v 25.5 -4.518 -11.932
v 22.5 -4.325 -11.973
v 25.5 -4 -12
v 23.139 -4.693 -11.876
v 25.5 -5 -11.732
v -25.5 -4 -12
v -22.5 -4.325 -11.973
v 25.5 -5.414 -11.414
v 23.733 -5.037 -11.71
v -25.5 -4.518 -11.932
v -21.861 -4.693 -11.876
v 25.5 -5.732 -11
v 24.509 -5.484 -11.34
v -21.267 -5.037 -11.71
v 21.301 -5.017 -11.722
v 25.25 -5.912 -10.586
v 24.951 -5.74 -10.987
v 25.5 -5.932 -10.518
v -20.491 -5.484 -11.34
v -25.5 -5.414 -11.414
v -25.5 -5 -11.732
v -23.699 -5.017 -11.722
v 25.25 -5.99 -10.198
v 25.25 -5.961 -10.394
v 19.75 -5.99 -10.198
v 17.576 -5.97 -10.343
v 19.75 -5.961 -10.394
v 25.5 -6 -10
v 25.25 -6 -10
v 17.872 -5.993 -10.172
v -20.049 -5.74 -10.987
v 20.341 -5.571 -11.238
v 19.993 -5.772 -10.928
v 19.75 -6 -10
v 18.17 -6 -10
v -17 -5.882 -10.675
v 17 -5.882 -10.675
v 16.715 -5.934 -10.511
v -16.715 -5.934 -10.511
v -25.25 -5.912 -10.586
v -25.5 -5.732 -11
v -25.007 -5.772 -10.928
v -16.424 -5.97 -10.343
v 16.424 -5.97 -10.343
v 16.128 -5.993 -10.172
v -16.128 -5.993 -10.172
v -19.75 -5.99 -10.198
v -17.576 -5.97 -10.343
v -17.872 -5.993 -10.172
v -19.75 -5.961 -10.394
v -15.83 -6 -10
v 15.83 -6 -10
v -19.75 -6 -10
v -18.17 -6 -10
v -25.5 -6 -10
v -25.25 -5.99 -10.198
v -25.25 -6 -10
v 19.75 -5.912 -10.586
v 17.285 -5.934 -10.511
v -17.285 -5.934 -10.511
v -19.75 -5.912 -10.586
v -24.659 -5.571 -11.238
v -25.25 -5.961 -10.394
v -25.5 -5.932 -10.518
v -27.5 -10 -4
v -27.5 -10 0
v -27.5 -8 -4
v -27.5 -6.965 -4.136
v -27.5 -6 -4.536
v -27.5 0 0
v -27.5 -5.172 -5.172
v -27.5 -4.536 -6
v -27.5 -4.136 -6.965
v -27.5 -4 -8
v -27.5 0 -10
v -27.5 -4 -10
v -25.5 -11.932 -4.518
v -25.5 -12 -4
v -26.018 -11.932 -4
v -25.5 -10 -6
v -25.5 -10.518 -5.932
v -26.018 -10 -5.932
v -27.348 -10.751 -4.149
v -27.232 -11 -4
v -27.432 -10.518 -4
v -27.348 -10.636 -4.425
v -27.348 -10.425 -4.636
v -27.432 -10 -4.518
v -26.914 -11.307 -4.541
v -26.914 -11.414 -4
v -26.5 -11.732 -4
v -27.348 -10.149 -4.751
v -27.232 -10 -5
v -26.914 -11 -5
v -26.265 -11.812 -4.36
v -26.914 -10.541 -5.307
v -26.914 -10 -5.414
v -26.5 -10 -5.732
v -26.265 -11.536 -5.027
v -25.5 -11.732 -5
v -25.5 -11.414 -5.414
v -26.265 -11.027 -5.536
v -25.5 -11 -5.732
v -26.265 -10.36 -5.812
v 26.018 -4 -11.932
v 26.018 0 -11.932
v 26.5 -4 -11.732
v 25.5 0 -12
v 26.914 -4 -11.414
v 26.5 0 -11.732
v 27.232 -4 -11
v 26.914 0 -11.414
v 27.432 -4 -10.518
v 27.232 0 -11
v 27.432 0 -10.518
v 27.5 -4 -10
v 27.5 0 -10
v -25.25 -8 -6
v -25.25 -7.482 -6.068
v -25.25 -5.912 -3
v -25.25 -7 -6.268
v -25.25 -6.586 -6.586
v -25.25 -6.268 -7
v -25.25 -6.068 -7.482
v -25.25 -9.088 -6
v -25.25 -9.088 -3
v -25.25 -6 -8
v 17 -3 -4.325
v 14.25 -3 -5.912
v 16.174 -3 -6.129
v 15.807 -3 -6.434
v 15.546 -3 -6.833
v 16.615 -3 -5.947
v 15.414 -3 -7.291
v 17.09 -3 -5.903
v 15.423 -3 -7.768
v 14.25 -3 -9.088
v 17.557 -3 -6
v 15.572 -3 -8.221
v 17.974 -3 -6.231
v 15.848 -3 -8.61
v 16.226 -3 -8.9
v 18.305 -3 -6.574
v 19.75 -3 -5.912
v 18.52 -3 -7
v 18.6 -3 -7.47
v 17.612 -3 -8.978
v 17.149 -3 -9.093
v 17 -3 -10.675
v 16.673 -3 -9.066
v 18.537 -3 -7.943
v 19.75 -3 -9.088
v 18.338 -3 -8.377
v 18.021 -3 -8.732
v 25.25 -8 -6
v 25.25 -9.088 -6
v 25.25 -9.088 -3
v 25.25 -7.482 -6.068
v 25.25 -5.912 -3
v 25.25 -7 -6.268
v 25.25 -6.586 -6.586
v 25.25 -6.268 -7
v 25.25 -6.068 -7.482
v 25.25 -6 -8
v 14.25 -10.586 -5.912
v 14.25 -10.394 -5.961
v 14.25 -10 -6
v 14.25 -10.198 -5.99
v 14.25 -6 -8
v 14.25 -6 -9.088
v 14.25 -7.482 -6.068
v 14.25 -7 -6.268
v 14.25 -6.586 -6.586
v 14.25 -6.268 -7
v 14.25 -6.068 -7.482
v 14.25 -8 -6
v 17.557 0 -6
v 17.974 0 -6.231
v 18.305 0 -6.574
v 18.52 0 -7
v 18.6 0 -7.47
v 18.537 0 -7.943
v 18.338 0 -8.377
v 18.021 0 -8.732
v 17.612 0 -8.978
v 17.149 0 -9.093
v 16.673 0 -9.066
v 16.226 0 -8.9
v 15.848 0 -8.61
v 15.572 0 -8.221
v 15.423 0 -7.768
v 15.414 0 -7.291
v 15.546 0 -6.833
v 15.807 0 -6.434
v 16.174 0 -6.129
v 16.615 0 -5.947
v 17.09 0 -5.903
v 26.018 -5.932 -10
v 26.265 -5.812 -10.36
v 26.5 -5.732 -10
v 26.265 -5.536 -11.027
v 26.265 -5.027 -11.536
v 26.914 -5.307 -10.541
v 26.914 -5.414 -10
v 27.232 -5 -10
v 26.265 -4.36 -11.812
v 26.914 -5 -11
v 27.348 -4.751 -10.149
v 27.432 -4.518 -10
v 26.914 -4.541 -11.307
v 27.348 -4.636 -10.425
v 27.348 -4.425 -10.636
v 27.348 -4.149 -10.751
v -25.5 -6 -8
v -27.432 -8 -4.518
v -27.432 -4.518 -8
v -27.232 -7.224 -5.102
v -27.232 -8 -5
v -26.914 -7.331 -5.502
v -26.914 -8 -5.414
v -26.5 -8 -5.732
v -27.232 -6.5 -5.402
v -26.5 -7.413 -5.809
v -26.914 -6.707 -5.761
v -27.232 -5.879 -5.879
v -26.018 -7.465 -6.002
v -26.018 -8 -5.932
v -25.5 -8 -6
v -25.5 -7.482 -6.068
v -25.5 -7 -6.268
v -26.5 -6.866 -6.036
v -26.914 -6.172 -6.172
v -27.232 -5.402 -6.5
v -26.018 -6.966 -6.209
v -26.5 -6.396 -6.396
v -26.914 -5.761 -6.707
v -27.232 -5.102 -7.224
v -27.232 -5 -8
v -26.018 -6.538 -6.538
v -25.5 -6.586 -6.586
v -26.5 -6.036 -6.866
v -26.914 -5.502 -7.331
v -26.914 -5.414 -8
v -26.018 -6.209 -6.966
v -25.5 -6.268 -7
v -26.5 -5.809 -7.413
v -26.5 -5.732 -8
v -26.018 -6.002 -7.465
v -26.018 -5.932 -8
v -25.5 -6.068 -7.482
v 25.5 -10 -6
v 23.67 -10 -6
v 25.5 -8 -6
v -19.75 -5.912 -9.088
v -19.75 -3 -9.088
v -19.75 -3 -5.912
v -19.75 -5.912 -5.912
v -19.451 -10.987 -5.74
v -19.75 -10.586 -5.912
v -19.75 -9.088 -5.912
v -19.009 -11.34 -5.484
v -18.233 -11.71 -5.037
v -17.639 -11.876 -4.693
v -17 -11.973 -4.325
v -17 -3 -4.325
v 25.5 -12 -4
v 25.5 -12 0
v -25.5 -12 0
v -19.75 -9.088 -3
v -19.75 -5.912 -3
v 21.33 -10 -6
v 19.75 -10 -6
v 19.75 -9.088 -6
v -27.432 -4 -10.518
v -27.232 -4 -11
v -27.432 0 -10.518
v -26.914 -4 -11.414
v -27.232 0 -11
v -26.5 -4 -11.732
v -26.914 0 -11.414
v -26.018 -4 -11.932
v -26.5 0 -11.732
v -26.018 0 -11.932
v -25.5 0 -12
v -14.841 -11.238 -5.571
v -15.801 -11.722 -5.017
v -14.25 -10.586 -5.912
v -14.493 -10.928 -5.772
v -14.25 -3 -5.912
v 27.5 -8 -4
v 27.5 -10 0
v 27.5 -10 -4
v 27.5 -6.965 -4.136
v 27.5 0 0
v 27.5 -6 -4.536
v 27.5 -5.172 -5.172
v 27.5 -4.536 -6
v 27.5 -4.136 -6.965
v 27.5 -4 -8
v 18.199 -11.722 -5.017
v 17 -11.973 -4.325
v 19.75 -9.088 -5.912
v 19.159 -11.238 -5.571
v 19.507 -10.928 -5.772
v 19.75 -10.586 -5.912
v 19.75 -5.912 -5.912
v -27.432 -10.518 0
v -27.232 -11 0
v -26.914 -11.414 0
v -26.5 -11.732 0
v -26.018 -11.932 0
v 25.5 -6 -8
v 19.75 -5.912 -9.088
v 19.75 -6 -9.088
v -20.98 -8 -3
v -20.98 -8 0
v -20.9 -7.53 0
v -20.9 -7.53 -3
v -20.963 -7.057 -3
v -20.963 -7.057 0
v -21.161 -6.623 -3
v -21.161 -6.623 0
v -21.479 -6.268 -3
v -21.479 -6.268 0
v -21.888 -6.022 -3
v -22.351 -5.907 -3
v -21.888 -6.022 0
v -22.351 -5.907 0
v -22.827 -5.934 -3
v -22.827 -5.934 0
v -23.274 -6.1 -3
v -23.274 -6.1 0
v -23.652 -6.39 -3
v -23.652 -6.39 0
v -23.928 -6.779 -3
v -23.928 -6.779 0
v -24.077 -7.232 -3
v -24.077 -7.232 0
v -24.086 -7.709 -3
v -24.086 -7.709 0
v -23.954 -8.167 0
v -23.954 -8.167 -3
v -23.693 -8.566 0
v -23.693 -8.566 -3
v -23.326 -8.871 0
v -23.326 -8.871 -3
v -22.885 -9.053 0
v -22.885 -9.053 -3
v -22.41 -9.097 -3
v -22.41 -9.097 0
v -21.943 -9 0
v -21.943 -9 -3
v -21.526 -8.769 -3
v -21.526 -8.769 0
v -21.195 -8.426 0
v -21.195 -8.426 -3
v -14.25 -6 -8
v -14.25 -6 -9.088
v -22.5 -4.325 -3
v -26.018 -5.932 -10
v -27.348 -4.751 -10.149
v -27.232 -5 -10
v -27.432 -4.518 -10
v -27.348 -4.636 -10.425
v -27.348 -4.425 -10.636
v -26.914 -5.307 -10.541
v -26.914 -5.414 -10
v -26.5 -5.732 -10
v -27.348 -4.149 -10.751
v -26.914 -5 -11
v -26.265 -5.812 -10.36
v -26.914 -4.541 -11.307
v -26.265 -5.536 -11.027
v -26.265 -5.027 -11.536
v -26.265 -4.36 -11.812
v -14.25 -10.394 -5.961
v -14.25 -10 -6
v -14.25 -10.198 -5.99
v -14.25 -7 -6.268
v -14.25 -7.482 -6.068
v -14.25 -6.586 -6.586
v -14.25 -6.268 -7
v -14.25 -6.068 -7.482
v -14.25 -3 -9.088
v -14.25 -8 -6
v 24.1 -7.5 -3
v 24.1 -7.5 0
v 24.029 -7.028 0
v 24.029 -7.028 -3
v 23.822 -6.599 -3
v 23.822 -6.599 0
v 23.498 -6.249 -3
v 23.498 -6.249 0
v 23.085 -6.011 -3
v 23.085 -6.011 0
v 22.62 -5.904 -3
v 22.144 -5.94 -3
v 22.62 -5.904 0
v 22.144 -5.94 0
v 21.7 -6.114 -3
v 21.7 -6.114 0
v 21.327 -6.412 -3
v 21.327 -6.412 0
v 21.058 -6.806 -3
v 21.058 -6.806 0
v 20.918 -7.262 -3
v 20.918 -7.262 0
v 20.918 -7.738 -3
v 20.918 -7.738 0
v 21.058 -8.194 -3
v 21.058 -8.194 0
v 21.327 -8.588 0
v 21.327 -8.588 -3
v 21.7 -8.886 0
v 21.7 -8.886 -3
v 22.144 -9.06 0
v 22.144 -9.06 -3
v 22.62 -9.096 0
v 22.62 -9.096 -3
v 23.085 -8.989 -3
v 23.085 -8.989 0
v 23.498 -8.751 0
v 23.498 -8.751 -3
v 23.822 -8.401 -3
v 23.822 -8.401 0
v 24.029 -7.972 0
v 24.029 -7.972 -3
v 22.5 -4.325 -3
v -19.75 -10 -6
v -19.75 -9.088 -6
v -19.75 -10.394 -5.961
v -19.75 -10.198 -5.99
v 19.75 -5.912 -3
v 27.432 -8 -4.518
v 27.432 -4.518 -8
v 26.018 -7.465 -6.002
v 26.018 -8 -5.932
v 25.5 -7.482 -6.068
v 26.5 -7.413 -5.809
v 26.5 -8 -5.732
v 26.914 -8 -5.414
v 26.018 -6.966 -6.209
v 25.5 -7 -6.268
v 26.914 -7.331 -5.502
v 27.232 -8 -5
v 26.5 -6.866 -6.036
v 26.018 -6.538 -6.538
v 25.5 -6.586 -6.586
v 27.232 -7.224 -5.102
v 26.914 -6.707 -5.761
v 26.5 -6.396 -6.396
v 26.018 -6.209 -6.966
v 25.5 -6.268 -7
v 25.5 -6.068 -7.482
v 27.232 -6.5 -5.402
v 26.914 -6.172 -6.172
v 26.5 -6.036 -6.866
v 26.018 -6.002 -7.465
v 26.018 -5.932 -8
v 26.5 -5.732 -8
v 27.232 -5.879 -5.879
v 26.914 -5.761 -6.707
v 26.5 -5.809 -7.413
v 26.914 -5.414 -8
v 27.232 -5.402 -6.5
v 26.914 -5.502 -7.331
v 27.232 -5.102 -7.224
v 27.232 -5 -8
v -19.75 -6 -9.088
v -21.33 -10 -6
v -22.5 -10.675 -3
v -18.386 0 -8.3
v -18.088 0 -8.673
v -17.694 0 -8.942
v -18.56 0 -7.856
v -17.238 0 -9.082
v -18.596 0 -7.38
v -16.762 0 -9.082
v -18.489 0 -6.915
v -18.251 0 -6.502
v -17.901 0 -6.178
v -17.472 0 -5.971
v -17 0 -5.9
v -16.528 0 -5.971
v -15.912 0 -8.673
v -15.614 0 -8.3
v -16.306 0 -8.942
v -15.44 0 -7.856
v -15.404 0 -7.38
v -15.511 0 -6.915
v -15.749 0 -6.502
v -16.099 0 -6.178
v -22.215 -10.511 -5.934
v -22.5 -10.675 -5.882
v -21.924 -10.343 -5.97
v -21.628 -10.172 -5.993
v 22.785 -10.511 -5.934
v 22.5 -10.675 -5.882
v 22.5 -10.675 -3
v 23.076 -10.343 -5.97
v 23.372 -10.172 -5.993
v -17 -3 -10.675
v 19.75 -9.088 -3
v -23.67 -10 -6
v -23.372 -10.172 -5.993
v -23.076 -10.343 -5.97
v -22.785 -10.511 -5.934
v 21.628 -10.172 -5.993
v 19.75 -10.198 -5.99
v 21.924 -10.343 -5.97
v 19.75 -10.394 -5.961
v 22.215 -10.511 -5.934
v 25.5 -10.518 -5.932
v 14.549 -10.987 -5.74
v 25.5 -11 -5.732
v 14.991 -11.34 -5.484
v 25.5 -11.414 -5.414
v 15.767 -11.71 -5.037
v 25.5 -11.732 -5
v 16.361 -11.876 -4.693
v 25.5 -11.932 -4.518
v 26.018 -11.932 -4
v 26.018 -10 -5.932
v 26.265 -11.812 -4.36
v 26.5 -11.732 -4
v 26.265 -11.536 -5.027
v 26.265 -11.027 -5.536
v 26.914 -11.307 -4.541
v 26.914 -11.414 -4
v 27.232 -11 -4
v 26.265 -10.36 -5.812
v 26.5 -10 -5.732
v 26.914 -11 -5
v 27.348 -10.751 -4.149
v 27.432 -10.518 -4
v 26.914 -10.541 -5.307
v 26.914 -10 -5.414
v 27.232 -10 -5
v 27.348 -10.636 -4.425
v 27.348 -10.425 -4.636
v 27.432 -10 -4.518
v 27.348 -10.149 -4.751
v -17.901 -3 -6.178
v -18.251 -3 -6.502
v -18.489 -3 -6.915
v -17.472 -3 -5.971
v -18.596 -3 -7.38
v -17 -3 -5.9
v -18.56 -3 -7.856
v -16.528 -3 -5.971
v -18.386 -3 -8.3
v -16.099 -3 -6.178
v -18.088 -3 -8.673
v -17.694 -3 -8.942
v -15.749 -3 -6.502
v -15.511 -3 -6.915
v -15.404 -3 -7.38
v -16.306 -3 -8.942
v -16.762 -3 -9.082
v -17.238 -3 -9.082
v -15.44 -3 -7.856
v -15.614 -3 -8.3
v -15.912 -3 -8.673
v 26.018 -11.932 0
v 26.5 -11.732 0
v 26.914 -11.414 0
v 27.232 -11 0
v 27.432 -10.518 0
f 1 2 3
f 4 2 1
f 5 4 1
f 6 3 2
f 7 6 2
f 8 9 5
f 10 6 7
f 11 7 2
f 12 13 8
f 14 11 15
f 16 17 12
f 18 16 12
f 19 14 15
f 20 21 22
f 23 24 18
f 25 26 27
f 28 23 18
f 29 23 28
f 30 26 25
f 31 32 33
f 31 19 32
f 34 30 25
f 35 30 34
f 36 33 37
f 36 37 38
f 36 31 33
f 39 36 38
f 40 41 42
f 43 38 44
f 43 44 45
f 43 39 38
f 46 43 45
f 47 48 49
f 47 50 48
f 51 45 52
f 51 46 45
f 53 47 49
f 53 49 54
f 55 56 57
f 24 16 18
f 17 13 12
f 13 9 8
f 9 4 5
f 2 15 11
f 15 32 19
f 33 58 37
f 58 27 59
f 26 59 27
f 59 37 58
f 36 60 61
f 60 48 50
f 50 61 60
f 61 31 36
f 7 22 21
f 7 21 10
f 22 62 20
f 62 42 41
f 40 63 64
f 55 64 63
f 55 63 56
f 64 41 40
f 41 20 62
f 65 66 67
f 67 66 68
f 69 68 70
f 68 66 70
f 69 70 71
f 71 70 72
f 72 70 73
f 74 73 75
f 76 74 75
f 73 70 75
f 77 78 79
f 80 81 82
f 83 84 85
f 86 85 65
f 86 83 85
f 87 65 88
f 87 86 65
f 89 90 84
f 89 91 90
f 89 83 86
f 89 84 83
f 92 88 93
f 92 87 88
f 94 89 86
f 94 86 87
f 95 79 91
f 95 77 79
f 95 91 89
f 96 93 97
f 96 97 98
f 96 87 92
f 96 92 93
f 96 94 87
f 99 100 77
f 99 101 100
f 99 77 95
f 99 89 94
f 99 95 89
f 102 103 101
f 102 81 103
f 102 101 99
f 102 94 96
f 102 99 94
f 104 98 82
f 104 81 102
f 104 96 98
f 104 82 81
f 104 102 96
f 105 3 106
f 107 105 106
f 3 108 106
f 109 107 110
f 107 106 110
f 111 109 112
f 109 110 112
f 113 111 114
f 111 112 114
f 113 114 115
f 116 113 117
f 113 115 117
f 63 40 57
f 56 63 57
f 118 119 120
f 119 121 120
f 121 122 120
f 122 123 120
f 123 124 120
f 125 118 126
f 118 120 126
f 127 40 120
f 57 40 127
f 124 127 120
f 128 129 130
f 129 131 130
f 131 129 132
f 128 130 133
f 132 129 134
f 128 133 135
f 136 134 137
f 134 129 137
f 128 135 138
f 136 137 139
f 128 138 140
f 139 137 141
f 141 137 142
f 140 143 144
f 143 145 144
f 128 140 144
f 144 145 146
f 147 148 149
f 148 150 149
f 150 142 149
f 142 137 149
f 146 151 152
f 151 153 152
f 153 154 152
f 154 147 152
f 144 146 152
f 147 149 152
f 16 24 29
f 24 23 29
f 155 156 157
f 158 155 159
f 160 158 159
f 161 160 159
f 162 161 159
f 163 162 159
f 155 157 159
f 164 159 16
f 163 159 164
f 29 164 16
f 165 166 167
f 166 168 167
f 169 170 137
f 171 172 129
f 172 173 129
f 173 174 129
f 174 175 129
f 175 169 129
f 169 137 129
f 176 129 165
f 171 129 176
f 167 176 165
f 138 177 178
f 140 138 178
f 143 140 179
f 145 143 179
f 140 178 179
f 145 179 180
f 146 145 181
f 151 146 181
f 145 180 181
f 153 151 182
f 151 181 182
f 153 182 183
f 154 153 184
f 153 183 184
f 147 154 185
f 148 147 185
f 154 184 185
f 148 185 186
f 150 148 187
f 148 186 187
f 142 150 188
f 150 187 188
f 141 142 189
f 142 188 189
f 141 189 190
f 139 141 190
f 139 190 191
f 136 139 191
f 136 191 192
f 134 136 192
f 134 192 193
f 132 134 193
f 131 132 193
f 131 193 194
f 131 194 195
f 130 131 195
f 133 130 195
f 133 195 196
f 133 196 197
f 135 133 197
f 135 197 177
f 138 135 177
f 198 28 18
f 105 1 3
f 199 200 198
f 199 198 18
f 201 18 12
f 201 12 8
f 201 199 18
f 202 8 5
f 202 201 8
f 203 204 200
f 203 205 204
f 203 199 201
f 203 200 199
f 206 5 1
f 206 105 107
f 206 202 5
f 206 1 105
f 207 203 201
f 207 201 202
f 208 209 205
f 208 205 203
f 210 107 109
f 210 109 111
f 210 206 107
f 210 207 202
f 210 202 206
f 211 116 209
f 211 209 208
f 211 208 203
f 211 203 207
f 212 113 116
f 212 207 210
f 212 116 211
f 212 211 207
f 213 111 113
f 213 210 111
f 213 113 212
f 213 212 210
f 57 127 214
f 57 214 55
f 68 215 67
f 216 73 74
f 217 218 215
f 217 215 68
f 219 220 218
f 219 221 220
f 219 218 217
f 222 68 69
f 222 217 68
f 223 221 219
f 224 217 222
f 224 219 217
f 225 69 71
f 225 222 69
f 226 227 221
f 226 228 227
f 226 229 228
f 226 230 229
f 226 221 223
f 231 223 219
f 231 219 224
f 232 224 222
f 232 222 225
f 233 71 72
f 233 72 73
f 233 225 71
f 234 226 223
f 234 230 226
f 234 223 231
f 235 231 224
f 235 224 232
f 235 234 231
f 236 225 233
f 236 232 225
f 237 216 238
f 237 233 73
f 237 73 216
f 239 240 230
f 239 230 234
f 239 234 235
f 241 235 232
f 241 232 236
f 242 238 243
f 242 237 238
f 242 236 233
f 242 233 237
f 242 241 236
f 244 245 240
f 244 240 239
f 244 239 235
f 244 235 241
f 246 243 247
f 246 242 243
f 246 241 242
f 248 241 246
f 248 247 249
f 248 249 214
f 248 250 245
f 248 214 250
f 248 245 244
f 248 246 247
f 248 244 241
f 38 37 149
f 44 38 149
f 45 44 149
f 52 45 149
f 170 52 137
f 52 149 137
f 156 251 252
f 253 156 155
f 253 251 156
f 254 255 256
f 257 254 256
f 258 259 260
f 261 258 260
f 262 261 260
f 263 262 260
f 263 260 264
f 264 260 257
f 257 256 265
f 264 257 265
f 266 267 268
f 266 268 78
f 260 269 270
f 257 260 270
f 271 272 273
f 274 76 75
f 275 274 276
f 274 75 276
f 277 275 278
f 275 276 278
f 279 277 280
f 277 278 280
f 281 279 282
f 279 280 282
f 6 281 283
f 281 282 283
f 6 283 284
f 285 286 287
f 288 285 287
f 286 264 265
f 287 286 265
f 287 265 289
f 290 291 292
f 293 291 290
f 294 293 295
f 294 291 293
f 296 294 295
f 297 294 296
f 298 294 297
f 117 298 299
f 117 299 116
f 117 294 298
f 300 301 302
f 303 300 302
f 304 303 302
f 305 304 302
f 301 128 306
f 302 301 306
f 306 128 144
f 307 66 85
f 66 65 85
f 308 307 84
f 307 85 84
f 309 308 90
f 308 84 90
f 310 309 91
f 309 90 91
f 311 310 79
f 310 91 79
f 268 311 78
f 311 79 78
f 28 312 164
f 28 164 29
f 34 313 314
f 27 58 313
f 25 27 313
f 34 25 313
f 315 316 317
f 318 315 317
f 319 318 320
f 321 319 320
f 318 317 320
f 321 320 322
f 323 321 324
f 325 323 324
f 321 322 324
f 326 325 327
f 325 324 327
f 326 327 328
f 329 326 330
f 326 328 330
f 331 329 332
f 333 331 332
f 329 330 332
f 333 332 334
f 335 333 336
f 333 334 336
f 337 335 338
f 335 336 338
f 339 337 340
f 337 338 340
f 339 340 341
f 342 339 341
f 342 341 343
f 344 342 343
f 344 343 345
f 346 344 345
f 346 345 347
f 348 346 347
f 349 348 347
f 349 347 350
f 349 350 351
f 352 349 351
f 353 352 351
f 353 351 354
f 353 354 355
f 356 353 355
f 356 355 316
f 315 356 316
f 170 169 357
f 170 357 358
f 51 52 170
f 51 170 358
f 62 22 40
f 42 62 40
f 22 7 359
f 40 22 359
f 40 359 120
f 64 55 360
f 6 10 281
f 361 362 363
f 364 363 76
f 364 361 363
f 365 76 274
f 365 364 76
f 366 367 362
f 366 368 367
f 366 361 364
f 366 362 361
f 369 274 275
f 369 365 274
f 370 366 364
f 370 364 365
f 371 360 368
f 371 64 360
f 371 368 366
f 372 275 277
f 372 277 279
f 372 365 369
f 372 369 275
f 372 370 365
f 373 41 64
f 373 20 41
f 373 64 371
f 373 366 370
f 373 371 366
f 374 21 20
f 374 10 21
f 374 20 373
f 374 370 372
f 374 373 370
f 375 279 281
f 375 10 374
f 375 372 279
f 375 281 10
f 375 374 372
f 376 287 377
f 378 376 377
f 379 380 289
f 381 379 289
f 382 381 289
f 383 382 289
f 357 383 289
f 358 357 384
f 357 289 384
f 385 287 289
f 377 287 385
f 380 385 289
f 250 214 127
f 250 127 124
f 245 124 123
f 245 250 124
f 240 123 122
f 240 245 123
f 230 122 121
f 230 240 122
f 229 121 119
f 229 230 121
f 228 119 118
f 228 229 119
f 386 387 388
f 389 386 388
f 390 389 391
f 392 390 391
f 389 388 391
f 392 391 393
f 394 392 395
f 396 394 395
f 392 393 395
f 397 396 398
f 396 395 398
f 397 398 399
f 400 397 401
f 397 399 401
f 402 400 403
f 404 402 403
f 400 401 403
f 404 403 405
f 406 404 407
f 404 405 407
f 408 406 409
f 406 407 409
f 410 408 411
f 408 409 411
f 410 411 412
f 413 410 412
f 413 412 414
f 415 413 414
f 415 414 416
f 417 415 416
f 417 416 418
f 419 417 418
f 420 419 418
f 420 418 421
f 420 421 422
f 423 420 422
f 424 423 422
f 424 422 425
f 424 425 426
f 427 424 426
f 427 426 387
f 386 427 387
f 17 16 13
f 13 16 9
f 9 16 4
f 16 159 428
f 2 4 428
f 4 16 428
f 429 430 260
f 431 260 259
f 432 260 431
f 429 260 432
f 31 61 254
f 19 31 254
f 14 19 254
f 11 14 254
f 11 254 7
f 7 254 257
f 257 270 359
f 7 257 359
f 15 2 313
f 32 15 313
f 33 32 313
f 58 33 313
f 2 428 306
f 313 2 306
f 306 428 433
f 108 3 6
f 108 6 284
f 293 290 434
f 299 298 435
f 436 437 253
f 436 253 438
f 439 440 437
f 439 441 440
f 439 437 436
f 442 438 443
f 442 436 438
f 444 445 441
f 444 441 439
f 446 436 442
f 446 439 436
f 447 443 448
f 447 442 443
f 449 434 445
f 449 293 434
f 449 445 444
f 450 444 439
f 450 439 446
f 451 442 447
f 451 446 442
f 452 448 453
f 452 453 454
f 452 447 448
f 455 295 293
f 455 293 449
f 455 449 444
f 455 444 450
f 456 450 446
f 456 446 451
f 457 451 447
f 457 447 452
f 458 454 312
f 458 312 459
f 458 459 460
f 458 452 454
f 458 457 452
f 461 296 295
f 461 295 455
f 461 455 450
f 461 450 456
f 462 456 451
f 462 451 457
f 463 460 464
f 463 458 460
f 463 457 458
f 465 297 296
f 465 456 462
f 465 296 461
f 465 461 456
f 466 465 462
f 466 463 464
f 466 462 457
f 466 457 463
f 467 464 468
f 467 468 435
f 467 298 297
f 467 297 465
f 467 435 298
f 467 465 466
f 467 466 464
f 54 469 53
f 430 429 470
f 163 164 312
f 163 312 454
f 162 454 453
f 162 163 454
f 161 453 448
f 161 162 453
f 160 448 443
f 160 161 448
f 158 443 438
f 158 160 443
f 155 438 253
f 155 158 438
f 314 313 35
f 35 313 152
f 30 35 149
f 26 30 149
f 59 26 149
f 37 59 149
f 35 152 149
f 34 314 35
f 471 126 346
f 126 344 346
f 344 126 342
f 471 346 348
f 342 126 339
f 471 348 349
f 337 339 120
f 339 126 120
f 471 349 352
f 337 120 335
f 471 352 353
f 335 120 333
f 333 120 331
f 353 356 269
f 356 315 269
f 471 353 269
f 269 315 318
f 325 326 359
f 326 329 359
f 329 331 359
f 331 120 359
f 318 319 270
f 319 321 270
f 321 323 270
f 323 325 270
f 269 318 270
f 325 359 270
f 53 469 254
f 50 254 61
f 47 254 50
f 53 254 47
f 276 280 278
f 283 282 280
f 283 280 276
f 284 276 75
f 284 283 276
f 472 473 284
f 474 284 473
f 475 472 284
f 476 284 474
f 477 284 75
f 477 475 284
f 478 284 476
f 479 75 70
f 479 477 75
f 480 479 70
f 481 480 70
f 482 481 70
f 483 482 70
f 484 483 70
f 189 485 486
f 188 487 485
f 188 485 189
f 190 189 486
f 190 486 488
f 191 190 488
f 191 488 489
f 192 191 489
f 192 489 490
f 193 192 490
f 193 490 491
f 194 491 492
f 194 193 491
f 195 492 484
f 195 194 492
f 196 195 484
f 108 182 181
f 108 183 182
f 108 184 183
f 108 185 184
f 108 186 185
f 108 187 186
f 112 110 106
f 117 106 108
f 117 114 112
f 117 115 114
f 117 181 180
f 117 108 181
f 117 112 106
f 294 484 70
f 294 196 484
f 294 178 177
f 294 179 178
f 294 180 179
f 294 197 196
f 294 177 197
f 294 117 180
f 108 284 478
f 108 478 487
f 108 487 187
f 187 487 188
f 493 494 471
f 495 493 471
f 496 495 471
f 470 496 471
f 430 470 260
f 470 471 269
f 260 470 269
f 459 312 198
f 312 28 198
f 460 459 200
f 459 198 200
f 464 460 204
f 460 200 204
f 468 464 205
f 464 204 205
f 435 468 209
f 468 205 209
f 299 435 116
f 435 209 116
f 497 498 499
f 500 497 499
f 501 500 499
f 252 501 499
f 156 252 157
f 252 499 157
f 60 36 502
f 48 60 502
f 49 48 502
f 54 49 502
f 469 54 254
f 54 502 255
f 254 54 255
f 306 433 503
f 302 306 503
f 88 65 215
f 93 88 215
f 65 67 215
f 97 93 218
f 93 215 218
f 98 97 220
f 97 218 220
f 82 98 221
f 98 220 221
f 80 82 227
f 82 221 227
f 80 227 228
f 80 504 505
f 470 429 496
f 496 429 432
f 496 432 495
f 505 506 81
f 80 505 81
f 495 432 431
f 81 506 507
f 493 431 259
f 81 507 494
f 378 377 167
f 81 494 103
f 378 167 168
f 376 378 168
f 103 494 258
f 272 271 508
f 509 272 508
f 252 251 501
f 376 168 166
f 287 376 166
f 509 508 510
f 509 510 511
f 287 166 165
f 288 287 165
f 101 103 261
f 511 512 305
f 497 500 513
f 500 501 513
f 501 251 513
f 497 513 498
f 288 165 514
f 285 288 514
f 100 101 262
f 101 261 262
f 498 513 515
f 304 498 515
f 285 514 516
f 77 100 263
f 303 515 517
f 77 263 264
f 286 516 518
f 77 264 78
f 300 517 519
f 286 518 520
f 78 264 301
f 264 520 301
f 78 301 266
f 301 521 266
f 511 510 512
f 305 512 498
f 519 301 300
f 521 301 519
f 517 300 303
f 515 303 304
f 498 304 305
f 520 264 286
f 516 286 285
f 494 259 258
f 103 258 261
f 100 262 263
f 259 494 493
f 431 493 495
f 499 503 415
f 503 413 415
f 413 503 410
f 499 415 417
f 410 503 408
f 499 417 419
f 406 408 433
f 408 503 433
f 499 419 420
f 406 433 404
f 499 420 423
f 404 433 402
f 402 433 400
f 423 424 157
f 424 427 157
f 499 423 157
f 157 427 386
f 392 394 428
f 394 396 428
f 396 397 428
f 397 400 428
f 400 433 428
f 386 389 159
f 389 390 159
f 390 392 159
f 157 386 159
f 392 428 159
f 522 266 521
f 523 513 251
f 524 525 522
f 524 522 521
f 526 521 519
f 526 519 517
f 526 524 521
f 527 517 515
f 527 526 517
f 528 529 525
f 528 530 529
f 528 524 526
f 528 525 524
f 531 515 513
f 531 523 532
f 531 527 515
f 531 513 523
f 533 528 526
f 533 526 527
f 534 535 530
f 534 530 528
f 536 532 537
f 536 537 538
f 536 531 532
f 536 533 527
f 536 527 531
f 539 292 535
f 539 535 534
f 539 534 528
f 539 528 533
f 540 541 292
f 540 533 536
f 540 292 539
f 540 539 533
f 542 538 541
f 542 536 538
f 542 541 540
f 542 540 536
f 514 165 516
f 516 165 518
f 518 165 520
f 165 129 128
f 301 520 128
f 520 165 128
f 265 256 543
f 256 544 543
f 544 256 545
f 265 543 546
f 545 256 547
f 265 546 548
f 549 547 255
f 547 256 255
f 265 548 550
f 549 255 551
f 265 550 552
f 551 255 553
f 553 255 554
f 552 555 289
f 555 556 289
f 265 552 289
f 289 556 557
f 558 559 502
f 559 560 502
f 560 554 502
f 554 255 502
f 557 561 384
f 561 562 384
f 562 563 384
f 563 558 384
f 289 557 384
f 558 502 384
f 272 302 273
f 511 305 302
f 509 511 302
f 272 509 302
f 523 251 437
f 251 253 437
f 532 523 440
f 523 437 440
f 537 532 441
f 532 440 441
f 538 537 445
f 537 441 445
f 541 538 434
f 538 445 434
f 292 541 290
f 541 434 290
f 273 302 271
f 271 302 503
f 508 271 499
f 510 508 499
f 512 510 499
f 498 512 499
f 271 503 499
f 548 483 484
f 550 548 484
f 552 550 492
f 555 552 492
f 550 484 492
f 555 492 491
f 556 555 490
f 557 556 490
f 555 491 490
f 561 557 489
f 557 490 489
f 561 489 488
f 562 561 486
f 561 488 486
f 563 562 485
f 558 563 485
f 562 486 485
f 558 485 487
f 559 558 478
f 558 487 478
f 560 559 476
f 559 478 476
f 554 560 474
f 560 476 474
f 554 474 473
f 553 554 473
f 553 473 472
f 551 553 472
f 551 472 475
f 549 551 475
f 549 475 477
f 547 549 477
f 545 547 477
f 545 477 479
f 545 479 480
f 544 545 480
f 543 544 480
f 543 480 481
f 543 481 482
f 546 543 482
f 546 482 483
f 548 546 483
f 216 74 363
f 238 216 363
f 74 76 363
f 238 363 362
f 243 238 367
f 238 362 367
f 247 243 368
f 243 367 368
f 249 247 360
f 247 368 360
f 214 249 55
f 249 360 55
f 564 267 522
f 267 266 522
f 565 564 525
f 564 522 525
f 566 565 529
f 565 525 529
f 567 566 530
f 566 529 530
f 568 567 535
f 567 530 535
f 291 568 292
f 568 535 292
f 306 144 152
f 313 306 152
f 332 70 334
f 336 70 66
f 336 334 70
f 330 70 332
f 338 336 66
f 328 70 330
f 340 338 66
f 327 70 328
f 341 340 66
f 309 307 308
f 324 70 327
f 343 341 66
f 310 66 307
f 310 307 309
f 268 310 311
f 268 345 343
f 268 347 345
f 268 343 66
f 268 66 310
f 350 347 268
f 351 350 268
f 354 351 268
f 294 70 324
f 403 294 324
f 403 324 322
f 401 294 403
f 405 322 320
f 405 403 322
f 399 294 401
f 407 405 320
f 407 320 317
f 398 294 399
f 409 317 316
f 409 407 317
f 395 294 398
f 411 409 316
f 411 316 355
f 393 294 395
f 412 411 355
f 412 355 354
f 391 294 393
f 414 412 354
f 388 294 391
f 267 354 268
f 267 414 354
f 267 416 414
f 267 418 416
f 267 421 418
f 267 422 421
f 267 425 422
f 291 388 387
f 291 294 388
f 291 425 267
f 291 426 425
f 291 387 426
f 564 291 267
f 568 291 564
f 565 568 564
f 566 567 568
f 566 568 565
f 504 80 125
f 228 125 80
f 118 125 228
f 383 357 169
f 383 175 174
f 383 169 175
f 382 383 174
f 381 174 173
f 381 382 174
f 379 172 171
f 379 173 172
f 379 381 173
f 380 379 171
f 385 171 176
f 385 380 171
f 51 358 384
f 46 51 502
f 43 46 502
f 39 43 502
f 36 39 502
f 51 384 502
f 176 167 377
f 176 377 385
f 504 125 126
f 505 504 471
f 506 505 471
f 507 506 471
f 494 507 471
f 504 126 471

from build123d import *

# Parameters (mm, degrees)
EXTRU_MINCE1_DEPTH      = 27.5
CONG_2_R                = 2
ESQUISSE2_R             = 1.6
ENL_V_MAT_EXTRU_1_DEPTH = 33.314857264
ESQUISSE3_R             = 1.6
ENL_V_MAT_EXTRU_2_DEPTH = 33.314857386
ENL_V_START             = -3
ENL_V_MAT_EXTRU_3_DEPTH = 30.314857423
ENL_V_MAT_EXTRU_4_DEPTH = 30.314857386
CONG_1_R                = 2


with BuildPart() as part:
    # Esquisse1 → Extru.-Mince1 (new, symmetric)
    with BuildSketch(Plane(origin=(0, 0, 0), x_dir=(0, 0, -1), z_dir=(1, 0, 0))):
        Polygon((12, 0), (0, 0), (0, -12), (6, -12), (6, -6), (12, -6), align=None)
    extrude(amount=EXTRU_MINCE1_DEPTH, both=True)

    # Congé2
    cong_2_edges = [part.edges().sort_by_distance(p)[0] for p in [
        (0, -12, -6),
        (0, -6, -12),
        (0, -6, -6),
    ]]
    fillet(cong_2_edges, radius=CONG_2_R)

    # Esquisse2 → Enlèv. mat.-Extru.1 (cut, through all)
    with BuildSketch(Plane(origin=(0, 0, 0), x_dir=(1, 0, 0), z_dir=(0, 1, 0))):
        with Locations((-17, 7.5)):
            Circle(ESQUISSE2_R)
        with Locations((17, 7.5)):
            Circle(ESQUISSE2_R)
    extrude(amount=-ENL_V_MAT_EXTRU_1_DEPTH, mode=Mode.SUBTRACT)

    # Esquisse3 → Enlèv. mat.-Extru.2 (cut, through all)
    with BuildSketch(Plane.XY):
        with Locations((22.5, -7.5)):
            Circle(ESQUISSE3_R)
        with Locations((-22.5, -7.5)):
            Circle(ESQUISSE3_R)
    extrude(amount=-ENL_V_MAT_EXTRU_2_DEPTH, mode=Mode.SUBTRACT)

    # Esquisse4 → Enlèv. mat.-Extru.3 (cut, through all)
    with BuildSketch(Plane(origin=(0, 0, 0), x_dir=(1, 0, 0), z_dir=(0, 1, 0)).offset(ENL_V_START)):
        Polygon((-14.25, 9.08771324), (-17, 10.675426481), (-19.75, 9.08771324), (-19.75, 5.91228676), (-17, 4.324573519), (-14.25, 5.91228676), align=None)
        Polygon((19.75, 9.08771324), (17, 10.675426481), (14.25, 9.08771324), (14.25, 5.91228676), (17, 4.324573519), (19.75, 5.91228676), align=None)
    extrude(amount=-ENL_V_MAT_EXTRU_3_DEPTH, mode=Mode.SUBTRACT)

    # Esquisse5 → Enlèv. mat.-Extru.4 (cut, through all)
    with BuildSketch(Plane.XY.offset(ENL_V_START)):
        Polygon((25.25, -5.91228676), (22.5, -4.324573519), (19.75, -5.91228676), (19.75, -9.08771324), (22.5, -10.675426481), (25.25, -9.08771324), align=None)
        Polygon((-19.75, -9.08771324), (-19.75, -5.91228676), (-22.5, -4.324573519), (-25.25, -5.91228676), (-25.25, -9.08771324), (-22.5, -10.675426481), align=None)
    extrude(amount=-ENL_V_MAT_EXTRU_4_DEPTH, mode=Mode.SUBTRACT)

    # Congé1
    cong_1_edges = [part.edges().sort_by_distance(p)[0] for p in [
        (27.5, -2, -12),
        (-27.5, -2, -12),
        (27.5, -12, -2),
        (27.5, -11.414213562, -5.414213562),
        (27.5, -9, -6),
        (27.5, -6.585786438, -6.585786438),
        (27.5, -6, -9),
        (27.5, -5.414213562, -11.414213562),
        (-27.5, -12, -2),
        (-27.5, -11.414213562, -5.414213562),
        (-27.5, -9, -6),
        (-27.5, -6.585786438, -6.585786438),
        (-27.5, -6, -9),
        (-27.5, -5.414213562, -11.414213562),
    ]]
    fillet(cong_1_edges, radius=CONG_1_R)


solid = part.part
